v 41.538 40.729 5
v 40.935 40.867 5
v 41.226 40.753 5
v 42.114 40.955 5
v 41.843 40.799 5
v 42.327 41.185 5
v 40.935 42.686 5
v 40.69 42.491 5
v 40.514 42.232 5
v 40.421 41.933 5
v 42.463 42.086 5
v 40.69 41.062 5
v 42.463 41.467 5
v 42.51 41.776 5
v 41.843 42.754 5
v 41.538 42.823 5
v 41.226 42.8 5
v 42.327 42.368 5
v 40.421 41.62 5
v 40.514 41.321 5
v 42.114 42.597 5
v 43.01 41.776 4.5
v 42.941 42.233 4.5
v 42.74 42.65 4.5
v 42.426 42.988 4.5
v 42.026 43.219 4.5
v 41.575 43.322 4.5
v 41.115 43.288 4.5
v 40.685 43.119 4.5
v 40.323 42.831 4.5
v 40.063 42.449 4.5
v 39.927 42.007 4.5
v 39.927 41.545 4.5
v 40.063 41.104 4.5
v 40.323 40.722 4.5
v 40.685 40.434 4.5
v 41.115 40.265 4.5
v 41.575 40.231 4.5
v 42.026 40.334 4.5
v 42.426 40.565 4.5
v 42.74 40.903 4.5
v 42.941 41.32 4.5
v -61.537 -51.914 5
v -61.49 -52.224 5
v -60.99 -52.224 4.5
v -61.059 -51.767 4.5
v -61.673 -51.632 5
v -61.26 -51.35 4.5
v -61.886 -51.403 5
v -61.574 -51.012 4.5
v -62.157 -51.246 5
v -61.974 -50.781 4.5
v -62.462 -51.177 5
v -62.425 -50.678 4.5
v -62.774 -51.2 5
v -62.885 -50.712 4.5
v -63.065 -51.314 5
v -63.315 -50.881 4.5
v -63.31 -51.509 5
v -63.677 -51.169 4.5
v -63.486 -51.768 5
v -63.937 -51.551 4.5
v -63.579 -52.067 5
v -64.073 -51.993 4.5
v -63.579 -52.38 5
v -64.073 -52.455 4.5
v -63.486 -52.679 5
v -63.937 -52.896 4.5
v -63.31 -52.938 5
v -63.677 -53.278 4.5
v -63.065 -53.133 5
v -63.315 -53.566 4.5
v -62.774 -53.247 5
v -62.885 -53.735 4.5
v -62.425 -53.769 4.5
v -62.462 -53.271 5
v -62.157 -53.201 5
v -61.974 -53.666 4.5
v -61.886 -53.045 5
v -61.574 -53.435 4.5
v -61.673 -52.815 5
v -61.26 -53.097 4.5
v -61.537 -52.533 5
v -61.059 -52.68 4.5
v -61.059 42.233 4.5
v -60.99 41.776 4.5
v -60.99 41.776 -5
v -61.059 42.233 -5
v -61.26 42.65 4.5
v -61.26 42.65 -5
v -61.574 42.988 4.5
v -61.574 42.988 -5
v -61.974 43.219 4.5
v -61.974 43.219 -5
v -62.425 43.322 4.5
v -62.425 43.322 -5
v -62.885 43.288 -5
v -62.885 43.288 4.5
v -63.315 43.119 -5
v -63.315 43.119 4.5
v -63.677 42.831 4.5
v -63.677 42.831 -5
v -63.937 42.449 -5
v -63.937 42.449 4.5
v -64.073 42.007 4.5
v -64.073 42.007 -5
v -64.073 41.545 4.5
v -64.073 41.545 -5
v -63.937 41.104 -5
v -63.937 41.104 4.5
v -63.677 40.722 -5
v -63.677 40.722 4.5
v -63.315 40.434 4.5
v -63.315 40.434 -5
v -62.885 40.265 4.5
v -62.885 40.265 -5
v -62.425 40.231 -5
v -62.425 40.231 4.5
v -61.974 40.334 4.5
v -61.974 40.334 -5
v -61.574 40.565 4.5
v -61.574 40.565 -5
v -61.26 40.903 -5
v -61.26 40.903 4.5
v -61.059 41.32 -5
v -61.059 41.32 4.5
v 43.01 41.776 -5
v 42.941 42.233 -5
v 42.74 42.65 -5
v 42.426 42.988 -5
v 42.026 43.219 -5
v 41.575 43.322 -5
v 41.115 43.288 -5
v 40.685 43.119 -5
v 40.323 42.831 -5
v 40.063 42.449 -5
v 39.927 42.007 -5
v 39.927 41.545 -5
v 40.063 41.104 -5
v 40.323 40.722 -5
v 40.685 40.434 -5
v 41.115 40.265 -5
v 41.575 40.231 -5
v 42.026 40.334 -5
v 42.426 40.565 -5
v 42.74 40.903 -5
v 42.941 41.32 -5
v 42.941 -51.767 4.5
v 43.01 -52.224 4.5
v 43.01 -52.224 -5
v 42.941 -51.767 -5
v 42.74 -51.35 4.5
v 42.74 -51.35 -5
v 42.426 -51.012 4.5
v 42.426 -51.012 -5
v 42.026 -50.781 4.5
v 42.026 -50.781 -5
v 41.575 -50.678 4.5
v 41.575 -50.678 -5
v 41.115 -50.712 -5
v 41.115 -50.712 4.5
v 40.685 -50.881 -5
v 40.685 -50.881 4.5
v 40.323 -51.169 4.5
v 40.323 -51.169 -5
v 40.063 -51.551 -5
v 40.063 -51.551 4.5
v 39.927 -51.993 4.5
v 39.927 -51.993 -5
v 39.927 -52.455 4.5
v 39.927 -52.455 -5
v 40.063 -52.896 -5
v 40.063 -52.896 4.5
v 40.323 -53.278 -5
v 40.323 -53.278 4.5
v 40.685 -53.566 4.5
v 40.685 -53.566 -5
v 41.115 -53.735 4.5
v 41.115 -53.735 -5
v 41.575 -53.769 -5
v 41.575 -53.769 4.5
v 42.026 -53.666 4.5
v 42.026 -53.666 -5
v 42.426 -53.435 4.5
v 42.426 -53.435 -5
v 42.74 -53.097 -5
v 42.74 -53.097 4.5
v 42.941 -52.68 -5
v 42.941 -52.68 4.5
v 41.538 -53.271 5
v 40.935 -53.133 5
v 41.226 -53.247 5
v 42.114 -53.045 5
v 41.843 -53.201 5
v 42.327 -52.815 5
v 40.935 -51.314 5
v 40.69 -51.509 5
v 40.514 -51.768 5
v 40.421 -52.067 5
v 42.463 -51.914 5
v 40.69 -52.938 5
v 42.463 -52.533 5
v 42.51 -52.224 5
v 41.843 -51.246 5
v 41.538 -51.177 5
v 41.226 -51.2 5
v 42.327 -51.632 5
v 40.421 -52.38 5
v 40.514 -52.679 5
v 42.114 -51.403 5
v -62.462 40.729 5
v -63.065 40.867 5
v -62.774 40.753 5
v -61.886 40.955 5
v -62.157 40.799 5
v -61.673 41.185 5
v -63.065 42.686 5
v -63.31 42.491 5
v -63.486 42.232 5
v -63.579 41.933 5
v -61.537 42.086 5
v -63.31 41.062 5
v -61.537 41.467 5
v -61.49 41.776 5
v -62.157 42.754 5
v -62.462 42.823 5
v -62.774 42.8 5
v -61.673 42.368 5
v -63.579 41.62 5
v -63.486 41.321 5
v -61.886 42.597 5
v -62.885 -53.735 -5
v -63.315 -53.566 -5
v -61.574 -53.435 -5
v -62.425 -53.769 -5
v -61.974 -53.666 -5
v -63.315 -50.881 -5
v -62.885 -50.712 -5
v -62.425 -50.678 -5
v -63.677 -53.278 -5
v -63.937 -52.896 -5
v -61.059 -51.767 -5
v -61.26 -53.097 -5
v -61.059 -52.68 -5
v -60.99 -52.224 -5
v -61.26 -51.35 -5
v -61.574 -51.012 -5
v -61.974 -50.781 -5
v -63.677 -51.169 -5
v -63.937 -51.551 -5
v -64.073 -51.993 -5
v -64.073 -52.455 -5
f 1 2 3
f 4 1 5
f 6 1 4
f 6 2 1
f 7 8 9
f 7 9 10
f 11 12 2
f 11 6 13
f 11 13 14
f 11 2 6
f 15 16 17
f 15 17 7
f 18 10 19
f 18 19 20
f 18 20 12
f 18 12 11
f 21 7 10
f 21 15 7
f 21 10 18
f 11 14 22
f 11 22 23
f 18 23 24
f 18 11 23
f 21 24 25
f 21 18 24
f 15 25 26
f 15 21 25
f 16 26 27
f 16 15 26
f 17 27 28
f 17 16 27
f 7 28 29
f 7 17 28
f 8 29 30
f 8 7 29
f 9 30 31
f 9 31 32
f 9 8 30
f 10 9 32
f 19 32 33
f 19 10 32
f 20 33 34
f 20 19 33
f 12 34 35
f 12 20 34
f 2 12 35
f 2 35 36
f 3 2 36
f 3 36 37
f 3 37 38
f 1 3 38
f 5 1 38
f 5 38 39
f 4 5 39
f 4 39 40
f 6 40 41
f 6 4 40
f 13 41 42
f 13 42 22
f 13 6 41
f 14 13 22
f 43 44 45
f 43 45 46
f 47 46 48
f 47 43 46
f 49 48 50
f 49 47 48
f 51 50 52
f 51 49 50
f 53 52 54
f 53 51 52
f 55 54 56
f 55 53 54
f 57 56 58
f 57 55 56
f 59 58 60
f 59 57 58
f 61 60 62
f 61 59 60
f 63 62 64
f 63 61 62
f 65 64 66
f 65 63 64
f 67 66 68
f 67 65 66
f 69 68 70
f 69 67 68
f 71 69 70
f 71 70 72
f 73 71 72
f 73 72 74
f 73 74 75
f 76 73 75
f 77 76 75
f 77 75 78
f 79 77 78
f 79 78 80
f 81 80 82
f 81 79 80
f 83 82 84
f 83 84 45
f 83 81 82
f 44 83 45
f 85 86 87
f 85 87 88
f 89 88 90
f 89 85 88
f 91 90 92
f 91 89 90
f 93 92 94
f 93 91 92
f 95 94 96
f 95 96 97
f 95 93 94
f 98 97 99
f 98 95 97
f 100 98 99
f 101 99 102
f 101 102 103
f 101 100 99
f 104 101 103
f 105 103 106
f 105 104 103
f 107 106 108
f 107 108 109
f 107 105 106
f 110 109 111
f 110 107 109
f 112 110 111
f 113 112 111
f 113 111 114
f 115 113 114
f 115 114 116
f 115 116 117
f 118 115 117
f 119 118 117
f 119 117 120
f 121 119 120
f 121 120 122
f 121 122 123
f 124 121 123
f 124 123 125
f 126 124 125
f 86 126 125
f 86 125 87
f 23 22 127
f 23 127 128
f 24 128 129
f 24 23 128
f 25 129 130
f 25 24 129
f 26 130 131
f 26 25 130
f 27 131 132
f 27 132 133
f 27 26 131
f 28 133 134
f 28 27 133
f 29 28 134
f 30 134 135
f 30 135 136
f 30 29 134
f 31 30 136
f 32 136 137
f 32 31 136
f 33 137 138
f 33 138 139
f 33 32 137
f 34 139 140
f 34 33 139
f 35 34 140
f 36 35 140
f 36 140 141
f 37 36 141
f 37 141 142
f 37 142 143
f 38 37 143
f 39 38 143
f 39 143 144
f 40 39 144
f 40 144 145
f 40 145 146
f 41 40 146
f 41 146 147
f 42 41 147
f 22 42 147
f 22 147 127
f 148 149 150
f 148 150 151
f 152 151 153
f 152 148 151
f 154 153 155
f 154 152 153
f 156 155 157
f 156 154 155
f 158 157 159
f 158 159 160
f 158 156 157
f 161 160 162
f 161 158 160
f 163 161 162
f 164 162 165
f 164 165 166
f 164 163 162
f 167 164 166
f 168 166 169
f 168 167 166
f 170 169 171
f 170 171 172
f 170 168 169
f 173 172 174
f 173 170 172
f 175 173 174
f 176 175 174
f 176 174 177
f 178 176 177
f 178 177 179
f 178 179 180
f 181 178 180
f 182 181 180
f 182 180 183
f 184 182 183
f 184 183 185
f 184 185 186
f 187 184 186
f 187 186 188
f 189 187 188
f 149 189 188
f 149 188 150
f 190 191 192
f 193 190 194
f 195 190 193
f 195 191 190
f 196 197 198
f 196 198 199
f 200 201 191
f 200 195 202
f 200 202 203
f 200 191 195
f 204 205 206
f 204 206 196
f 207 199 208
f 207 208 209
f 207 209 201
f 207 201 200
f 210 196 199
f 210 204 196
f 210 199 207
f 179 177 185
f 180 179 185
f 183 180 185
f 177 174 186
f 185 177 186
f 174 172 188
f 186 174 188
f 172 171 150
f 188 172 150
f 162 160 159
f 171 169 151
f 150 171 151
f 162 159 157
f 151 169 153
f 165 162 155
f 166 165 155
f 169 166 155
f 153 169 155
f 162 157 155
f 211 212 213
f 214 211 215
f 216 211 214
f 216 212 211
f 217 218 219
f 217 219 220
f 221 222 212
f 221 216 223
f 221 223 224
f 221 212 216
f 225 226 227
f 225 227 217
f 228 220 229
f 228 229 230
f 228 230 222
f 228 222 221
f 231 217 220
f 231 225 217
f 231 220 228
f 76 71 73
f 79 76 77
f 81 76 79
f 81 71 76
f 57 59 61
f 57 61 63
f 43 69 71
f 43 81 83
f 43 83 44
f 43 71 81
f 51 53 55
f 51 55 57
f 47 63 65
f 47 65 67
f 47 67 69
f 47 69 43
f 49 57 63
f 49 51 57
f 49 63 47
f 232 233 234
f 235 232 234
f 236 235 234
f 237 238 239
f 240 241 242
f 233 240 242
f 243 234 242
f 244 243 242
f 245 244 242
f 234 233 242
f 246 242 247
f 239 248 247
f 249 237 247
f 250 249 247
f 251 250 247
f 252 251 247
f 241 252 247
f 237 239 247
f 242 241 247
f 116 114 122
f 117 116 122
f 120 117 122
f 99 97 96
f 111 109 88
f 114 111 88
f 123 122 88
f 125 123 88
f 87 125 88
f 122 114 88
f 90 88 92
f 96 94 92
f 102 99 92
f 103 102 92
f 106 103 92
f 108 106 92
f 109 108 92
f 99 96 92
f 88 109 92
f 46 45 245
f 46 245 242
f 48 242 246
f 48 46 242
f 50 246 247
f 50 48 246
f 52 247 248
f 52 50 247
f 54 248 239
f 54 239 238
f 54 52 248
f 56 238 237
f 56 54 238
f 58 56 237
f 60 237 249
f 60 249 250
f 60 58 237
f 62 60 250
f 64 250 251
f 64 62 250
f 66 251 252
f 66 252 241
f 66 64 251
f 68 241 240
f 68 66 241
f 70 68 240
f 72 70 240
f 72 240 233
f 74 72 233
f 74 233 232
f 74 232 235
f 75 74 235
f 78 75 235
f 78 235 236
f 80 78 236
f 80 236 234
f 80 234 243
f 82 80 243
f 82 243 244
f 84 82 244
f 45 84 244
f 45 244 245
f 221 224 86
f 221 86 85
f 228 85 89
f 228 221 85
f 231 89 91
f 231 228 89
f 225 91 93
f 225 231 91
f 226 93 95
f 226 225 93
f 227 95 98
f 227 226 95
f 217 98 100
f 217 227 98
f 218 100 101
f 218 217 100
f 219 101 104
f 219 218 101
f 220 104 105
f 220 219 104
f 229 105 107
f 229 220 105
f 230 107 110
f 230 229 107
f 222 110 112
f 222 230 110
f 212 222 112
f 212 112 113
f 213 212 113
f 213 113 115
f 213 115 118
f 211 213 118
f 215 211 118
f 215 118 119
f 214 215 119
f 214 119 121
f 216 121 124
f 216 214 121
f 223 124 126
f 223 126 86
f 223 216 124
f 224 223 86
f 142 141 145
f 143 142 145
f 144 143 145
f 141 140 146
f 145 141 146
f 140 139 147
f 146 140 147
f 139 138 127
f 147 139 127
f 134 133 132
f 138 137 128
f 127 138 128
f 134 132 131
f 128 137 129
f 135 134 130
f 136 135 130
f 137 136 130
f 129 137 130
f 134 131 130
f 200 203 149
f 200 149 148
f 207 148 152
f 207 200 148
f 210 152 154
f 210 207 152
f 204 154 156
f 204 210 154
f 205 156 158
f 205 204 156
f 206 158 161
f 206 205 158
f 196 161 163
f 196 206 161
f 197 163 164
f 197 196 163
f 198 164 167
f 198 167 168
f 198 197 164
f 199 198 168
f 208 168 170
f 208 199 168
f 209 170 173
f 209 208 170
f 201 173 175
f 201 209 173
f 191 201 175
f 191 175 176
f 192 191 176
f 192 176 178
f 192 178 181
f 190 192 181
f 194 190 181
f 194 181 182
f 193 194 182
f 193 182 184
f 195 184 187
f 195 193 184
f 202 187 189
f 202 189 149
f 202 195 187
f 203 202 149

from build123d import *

# Parameters (mm, degrees)
F0_R      = 1.55
F5_DEPTH  = 5
F6_SIZE   = 0.5
F7_DEPTH  = 5
F8_SIZE   = 0.5
F9_DEPTH  = 5
F10_SIZE  = 0.5
F11_DEPTH = 5
F12_SIZE  = 0.5


# Not quite as in the source:
# - the program builds the solid bodies; features that only make, move or delete a surface that nothing else refers to are left out


with BuildPart() as f5:
    # F0 (on Top) → F5 (new body, symmetric)
    with BuildSketch(Plane.XY):
        with Locations((-62.5403363705, -52.2236271612)):
            Circle(F0_R)
    extrude(amount=F5_DEPTH, both=True)

    # F6
    f6_edges = [f5.edges().sort_by_distance(p)[0] for p in [
        (-64.090336, -52.223627, 5),
    ]]
    chamfer(f6_edges, length=F6_SIZE)


with BuildPart() as f7:
    # F0 (on Top) → F7 (new body, symmetric)
    with BuildSketch(Plane.XY):
        with Locations((41.4596636295, -52.2236271612)):
            Circle(F0_R)
    extrude(amount=F7_DEPTH, both=True)

    # F8
    f8_edges = [f7.edges().sort_by_distance(p)[0] for p in [
        (39.909664, -52.223627, 5),
    ]]
    chamfer(f8_edges, length=F8_SIZE)


with BuildPart() as f9:
    # F0 (on Top) → F9 (new body, symmetric)
    with BuildSketch(Plane.XY):
        with Locations((41.4596636295, 41.7763728388)):
            Circle(F0_R)
    extrude(amount=F9_DEPTH, both=True)

    # F10
    f10_edges = [f9.edges().sort_by_distance(p)[0] for p in [
        (39.909664, 41.776373, 5),
    ]]
    chamfer(f10_edges, length=F10_SIZE)


with BuildPart() as f11:
    # F0 (on Top) → F11 (new body, symmetric)
    with BuildSketch(Plane.XY):
        with Locations((-62.5403363705, 41.7763728388)):
            Circle(F0_R)
    extrude(amount=F11_DEPTH, both=True)

    # F12
    f12_edges = [f11.edges().sort_by_distance(p)[0] for p in [
        (-64.090336, 41.776373, 5),
    ]]
    chamfer(f12_edges, length=F12_SIZE)


solid = Compound([f5.part, f7.part, f9.part, f11.part])
